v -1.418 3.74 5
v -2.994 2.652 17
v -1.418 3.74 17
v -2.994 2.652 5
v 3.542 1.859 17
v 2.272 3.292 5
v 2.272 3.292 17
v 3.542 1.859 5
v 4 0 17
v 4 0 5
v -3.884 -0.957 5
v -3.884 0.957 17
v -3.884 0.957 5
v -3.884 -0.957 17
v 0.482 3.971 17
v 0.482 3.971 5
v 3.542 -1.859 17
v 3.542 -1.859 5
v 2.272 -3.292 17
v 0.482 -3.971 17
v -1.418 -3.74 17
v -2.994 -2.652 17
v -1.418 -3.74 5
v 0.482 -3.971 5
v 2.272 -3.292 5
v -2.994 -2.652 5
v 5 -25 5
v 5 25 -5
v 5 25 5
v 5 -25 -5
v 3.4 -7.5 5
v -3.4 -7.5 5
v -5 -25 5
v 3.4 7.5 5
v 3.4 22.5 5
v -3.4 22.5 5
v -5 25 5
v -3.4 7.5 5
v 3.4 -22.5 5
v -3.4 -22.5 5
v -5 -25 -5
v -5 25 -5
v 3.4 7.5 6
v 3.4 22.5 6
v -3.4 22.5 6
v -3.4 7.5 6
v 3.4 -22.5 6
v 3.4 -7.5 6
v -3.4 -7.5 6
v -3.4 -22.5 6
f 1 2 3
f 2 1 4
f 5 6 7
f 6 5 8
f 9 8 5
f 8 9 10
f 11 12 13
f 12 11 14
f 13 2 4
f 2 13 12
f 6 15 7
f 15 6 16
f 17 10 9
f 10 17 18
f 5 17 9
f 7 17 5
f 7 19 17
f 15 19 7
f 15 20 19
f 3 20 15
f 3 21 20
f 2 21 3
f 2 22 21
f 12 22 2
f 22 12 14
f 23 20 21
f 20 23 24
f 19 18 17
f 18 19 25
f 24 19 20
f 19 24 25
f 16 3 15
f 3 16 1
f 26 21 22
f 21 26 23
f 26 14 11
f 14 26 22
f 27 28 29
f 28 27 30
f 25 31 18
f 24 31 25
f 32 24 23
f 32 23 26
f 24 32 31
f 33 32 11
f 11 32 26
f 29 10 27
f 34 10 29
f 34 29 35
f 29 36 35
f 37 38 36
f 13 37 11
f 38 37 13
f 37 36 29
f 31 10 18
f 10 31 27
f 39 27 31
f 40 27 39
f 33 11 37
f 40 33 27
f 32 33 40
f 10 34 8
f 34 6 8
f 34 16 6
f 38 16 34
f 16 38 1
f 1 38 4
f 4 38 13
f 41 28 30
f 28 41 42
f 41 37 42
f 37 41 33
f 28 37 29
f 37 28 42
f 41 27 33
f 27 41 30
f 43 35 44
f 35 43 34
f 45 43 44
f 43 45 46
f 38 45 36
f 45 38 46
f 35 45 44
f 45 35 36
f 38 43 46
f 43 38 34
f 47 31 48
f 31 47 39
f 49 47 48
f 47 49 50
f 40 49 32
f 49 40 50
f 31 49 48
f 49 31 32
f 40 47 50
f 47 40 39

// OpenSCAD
plug_r = 4;

cylinder(17, plug_r, plug_r);
cube([10, 50, 10], true);
translate([0,15,1])
cube([6.8, 15, 10], true);

translate([0,-15,1])
cube([6.8, 15, 10], true);
